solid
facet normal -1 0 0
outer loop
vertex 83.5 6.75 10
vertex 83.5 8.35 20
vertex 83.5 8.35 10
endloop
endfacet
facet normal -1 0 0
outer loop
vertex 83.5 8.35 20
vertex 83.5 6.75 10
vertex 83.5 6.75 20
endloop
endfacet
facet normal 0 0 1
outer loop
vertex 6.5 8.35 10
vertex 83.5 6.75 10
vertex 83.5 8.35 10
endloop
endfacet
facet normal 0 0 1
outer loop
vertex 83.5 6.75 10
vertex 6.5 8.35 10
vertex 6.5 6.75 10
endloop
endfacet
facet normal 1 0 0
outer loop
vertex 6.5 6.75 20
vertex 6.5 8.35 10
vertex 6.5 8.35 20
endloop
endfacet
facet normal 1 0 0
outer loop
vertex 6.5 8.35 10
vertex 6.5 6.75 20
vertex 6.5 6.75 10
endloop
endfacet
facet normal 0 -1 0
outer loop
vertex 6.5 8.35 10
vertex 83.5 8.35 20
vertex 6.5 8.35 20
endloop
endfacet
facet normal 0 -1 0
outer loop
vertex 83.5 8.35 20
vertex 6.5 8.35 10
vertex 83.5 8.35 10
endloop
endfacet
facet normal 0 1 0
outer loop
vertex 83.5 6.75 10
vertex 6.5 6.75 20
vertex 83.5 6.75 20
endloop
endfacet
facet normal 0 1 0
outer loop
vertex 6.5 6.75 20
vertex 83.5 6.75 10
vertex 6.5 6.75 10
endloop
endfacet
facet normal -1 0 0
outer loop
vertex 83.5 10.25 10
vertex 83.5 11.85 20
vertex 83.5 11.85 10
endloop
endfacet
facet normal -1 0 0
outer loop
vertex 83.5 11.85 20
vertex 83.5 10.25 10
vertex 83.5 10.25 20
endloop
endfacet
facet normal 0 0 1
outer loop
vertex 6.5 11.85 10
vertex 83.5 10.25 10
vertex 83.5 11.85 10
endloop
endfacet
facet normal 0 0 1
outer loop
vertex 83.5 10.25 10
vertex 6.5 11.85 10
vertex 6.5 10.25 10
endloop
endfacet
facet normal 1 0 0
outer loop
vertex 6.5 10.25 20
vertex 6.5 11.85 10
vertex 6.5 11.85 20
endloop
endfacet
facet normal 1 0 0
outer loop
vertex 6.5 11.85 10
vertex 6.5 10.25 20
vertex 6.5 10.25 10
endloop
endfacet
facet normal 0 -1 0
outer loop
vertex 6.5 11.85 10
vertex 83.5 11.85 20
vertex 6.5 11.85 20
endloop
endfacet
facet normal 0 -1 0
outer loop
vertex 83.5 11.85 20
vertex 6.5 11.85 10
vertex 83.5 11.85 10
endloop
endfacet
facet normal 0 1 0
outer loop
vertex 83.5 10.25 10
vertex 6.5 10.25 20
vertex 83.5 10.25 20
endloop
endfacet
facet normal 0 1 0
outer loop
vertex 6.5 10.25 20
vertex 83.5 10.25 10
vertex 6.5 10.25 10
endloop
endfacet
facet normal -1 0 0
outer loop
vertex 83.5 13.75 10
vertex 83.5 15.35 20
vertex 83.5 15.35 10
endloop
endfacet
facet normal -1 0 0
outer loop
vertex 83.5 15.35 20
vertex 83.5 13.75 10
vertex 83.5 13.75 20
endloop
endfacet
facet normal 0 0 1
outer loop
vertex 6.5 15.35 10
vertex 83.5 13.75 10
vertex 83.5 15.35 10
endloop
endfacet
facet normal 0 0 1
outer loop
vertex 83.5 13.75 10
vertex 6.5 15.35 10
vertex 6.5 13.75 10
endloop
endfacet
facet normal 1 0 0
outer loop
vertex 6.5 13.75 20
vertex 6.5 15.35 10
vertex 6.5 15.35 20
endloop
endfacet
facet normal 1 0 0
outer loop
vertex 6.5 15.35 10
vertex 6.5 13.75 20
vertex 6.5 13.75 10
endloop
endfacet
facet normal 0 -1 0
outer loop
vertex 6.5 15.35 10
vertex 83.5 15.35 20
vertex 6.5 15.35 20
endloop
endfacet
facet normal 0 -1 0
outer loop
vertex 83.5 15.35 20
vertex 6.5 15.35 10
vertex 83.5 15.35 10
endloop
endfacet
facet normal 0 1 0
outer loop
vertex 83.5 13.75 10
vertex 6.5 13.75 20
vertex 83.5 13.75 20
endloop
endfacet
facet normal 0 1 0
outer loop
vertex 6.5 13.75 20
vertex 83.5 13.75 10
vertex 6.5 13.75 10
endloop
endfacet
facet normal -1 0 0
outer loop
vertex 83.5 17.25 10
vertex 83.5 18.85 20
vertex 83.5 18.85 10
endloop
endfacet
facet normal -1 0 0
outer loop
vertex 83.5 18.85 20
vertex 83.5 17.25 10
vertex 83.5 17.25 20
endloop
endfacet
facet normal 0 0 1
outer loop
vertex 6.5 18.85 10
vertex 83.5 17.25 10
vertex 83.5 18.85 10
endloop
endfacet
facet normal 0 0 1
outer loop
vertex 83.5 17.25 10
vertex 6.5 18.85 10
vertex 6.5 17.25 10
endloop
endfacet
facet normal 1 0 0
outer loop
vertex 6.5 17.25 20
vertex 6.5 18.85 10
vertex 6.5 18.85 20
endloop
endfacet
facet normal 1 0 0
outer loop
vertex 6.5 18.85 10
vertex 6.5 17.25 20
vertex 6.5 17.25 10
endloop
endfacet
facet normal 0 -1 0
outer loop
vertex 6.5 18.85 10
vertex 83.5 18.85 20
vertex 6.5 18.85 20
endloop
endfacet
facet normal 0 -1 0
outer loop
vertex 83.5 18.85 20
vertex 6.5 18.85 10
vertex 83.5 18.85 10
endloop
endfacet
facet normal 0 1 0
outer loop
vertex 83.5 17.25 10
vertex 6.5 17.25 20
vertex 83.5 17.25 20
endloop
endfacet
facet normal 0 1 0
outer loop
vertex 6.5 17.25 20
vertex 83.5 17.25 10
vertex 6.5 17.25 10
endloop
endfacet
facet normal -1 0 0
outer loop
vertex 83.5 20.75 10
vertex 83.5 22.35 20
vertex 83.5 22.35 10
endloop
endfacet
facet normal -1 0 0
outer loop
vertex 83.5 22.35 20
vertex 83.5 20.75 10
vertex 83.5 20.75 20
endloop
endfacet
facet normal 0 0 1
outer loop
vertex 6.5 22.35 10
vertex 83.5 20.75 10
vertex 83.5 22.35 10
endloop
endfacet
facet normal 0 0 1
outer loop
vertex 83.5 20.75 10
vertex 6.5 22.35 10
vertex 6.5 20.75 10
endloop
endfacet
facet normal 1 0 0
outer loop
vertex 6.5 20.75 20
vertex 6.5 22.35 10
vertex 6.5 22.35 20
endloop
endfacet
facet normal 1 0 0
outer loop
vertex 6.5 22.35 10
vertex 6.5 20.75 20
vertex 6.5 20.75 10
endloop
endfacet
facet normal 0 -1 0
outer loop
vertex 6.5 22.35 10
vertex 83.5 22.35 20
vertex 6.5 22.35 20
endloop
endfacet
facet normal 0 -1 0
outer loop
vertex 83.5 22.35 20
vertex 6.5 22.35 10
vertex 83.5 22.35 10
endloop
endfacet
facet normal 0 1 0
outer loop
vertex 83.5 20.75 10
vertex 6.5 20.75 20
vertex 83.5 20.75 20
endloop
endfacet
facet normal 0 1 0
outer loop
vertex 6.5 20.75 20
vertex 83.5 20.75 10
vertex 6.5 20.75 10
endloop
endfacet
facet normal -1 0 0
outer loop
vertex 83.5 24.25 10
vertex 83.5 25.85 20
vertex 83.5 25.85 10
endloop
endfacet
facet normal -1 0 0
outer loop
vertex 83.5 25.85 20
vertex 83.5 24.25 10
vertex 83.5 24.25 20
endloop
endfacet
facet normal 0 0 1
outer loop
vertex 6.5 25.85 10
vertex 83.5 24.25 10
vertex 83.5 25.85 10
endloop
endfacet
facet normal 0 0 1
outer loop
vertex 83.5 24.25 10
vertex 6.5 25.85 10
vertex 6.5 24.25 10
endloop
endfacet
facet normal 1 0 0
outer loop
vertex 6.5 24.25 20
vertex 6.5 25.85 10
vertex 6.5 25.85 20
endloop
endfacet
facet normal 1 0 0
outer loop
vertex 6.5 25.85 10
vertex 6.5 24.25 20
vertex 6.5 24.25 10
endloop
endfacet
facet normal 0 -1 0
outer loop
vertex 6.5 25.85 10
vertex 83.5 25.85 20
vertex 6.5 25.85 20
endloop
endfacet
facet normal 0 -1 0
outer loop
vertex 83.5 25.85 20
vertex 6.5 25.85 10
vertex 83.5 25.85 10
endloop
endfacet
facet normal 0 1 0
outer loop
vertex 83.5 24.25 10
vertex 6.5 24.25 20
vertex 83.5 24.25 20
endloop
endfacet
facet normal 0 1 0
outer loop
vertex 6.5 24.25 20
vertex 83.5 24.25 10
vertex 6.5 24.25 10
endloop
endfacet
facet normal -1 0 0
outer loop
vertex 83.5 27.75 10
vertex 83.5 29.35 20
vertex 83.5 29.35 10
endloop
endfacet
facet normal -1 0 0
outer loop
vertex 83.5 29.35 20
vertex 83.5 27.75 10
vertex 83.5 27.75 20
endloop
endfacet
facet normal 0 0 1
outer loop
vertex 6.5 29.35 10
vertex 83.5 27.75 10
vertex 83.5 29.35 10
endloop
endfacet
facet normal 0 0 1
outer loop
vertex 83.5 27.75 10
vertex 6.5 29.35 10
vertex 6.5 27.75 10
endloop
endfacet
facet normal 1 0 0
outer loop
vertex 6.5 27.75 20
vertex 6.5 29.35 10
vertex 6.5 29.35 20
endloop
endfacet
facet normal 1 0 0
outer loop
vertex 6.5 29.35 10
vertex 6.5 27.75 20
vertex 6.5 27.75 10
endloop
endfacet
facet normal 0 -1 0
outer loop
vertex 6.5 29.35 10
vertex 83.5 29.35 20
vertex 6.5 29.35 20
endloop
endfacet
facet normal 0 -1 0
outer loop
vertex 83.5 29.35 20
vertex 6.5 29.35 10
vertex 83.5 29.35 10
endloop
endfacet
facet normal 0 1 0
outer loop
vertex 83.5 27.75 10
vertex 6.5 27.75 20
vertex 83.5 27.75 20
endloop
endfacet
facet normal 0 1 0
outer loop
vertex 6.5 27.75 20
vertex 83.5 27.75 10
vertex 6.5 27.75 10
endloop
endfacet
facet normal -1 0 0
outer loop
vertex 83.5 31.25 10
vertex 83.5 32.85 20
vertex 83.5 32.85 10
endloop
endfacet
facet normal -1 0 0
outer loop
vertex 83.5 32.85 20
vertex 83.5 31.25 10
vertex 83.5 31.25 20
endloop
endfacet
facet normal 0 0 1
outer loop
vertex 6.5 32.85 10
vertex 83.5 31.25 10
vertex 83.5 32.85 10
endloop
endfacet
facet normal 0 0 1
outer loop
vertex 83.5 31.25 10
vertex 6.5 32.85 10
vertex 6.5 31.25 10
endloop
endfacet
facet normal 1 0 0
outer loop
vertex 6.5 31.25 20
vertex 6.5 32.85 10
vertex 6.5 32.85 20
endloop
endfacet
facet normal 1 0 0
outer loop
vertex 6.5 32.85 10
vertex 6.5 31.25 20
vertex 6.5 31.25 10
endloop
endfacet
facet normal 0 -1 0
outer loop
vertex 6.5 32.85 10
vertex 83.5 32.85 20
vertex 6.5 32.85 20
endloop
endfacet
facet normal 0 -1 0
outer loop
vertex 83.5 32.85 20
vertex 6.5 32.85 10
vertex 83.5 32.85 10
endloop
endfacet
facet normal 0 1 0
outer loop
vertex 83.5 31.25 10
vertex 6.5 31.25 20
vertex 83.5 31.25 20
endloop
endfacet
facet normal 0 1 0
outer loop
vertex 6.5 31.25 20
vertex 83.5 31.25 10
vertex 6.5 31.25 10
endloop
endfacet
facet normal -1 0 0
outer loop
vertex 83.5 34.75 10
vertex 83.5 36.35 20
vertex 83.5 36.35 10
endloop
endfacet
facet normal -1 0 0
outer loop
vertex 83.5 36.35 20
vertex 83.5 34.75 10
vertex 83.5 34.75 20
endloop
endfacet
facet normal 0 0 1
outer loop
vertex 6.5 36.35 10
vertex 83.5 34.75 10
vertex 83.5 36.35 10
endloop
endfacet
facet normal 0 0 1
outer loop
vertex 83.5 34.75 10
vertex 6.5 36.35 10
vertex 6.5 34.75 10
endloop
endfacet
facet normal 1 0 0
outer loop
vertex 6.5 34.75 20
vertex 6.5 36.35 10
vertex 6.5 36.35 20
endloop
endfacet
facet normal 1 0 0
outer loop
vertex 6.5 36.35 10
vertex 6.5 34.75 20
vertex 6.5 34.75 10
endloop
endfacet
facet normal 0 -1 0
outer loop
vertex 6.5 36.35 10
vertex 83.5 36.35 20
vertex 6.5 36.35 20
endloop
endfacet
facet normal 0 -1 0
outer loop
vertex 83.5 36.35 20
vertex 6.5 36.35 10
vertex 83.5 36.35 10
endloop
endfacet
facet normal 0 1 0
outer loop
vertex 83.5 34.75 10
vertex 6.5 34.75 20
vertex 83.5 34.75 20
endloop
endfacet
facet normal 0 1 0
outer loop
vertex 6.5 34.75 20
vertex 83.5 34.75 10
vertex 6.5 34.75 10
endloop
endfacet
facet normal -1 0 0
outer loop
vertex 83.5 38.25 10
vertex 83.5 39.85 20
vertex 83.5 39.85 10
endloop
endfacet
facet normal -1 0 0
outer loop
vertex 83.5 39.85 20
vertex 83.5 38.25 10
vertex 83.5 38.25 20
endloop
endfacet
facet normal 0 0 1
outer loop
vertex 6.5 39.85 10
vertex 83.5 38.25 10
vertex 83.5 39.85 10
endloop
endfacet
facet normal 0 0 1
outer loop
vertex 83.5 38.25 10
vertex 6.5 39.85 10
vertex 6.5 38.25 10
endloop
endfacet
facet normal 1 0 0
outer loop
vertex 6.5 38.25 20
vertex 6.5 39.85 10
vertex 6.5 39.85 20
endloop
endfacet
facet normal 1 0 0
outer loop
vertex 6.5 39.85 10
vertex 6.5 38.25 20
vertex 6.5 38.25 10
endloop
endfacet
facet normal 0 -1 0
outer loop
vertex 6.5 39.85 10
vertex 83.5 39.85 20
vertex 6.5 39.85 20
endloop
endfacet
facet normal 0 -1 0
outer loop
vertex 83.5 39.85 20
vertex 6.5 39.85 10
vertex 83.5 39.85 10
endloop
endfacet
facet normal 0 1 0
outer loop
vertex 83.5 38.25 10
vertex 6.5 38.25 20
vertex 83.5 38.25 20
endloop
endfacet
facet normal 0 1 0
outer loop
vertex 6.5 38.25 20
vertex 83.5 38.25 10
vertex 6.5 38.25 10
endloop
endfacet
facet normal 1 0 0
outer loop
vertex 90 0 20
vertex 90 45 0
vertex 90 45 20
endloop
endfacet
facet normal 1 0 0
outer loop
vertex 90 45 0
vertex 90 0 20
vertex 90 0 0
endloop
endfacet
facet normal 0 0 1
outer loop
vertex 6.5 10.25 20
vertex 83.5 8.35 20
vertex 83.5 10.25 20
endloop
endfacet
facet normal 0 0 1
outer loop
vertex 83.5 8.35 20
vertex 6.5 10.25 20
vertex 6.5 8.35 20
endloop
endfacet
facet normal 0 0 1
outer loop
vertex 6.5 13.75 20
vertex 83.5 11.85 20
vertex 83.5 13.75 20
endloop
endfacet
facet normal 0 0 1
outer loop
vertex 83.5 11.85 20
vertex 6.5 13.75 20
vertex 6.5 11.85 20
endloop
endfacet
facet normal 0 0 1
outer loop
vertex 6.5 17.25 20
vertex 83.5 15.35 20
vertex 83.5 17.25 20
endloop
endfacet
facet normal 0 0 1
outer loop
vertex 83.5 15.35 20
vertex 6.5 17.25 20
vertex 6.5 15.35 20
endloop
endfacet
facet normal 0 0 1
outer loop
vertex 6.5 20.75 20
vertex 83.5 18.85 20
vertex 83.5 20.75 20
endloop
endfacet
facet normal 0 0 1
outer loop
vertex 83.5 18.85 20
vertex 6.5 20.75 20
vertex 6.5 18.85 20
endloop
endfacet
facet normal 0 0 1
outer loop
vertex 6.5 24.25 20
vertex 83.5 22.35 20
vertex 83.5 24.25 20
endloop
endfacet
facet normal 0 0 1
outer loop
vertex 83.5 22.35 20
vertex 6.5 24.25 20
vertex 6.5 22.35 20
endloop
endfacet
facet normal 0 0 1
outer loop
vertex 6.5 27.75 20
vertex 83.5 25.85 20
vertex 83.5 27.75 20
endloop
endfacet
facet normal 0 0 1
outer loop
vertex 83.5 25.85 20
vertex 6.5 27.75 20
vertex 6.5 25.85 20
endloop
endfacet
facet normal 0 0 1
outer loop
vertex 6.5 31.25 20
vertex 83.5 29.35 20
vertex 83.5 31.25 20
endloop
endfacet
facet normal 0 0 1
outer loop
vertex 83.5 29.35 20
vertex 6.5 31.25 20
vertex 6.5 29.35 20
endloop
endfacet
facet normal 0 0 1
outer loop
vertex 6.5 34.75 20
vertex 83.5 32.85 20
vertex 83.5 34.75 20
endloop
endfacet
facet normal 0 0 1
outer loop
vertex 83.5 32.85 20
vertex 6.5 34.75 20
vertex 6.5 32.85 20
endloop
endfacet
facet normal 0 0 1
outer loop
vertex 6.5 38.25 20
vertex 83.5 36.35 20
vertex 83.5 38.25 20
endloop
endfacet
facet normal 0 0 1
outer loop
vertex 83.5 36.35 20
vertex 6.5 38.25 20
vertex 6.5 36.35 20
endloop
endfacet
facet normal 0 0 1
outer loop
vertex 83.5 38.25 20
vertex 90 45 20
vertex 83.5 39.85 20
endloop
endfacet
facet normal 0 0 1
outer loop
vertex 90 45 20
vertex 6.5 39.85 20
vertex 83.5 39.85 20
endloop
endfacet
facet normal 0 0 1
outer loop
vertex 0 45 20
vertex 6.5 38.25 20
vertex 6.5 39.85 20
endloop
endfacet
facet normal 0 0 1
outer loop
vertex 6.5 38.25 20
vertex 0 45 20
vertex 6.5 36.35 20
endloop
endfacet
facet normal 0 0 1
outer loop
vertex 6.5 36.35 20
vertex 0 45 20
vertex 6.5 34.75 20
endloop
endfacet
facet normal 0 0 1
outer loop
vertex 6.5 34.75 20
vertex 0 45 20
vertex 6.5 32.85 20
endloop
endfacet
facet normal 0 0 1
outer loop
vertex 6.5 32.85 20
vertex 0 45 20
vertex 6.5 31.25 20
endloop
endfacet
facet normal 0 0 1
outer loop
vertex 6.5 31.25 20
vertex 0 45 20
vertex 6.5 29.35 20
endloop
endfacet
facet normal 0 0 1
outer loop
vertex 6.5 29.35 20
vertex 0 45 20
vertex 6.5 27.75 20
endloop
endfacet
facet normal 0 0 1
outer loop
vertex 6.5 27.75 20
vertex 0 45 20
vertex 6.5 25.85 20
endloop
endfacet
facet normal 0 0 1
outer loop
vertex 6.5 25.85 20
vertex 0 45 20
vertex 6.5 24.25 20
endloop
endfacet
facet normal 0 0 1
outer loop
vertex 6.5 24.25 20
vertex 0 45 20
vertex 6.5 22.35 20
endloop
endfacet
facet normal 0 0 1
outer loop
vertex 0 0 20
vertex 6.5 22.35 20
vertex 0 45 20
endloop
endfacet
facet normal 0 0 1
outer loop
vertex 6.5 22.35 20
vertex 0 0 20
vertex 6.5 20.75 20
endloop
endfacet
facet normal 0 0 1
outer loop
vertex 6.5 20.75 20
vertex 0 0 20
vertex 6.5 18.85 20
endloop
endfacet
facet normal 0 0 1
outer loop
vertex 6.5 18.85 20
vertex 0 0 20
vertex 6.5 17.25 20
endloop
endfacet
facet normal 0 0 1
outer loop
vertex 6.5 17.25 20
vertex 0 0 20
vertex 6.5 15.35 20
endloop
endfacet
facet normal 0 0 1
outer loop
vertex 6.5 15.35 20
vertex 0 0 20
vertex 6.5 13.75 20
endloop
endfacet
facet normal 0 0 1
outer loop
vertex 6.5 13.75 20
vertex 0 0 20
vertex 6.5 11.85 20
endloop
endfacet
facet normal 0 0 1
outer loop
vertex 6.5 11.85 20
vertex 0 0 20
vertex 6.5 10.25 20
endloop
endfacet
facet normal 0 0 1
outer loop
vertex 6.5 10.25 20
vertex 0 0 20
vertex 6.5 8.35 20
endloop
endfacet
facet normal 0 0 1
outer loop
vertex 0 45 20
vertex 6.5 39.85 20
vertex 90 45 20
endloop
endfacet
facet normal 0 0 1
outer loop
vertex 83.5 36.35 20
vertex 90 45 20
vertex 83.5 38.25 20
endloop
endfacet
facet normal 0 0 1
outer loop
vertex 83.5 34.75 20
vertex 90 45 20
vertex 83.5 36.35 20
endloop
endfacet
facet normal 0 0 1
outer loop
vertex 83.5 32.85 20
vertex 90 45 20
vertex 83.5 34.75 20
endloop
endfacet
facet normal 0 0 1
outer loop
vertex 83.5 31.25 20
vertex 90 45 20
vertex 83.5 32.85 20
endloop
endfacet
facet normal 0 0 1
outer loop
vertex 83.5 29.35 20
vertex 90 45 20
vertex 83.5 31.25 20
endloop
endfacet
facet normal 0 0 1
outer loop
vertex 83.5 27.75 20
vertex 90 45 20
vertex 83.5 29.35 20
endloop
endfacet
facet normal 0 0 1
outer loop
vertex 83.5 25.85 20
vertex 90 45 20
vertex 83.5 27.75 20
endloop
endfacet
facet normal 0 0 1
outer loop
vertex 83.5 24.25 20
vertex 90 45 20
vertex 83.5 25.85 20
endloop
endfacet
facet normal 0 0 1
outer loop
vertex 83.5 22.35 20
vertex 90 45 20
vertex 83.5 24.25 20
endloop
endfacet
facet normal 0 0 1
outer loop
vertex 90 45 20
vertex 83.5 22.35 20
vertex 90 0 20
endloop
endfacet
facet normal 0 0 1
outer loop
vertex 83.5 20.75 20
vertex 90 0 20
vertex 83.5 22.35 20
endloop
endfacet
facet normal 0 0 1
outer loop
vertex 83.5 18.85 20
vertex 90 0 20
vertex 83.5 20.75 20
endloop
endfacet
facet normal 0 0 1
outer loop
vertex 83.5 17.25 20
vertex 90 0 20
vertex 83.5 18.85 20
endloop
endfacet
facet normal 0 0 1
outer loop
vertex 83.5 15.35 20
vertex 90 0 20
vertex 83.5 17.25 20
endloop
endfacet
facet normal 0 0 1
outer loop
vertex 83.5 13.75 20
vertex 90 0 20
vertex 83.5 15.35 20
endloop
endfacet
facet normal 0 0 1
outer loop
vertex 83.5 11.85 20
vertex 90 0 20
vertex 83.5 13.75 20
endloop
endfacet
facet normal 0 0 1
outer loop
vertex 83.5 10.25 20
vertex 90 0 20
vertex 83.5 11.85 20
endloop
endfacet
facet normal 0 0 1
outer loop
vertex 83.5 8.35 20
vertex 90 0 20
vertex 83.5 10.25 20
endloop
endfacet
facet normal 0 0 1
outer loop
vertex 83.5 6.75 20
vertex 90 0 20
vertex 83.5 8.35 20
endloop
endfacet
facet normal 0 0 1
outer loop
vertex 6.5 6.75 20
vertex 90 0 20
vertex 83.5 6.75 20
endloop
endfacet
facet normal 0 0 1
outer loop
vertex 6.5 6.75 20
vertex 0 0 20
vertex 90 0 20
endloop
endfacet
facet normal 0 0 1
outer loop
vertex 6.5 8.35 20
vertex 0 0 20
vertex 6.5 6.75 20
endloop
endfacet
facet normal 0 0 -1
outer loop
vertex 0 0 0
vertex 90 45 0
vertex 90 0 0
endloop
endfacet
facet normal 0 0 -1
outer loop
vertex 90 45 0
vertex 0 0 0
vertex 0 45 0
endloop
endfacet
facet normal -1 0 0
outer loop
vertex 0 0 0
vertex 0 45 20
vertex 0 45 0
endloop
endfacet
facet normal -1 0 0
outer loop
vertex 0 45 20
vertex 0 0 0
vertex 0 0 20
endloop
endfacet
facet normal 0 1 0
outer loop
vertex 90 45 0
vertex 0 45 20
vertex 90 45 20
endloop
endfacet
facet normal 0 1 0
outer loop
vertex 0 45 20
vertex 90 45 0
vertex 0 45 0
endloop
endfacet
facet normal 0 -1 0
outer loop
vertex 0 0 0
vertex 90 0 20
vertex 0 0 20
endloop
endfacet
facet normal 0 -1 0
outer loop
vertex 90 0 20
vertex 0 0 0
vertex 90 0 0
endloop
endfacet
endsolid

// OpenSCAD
$fn = 64; // resolution for curved shapes (not used here but kept for consistency)

// Base block dimensions (X, Y, Z)
block_L = 90;   // length in X
block_W = 45;   // width in Y
block_H = 20;   // height in Z

// Slot dimensions (X, Y, Z)
slot_L = 77;      // length along X
slot_W = 1.6;     // width along Y
slot_H = 10;      // depth along Z (cut into block)
slot_H_extra = 0.01; // extra depth to avoid coplanarity with block top face

// Slot spacing
slot_spacing = 3.5;   // centre‑to‑centre distance in Y
num_slots = 10;       // total number of slots

// Compute the X start coordinate of the slot shape so that its centre is at X = block_L/2
slot_X_start = block_L/2 - slot_L/2; // 45 - 38.5 = 6.5

// Compute the Y start coordinate of the first slot so that the group of slots is centred in Y
slot_Y_start = block_W/2 - ((num_slots-1)/2)*slot_spacing; // 22.5 - 4.5*3.5 = 6.75

// Build the drying rack
difference() {
    // Solid base block
    cube([block_L, block_W, block_H], center=false);

    // Subtract the 10 slots
    for (i = [0 : num_slots-1]) {
        translate([slot_X_start, slot_Y_start + i*slot_spacing, block_H - slot_H]) 
        cube([slot_L, slot_W, slot_H + slot_H_extra], center=false);
    }
}
